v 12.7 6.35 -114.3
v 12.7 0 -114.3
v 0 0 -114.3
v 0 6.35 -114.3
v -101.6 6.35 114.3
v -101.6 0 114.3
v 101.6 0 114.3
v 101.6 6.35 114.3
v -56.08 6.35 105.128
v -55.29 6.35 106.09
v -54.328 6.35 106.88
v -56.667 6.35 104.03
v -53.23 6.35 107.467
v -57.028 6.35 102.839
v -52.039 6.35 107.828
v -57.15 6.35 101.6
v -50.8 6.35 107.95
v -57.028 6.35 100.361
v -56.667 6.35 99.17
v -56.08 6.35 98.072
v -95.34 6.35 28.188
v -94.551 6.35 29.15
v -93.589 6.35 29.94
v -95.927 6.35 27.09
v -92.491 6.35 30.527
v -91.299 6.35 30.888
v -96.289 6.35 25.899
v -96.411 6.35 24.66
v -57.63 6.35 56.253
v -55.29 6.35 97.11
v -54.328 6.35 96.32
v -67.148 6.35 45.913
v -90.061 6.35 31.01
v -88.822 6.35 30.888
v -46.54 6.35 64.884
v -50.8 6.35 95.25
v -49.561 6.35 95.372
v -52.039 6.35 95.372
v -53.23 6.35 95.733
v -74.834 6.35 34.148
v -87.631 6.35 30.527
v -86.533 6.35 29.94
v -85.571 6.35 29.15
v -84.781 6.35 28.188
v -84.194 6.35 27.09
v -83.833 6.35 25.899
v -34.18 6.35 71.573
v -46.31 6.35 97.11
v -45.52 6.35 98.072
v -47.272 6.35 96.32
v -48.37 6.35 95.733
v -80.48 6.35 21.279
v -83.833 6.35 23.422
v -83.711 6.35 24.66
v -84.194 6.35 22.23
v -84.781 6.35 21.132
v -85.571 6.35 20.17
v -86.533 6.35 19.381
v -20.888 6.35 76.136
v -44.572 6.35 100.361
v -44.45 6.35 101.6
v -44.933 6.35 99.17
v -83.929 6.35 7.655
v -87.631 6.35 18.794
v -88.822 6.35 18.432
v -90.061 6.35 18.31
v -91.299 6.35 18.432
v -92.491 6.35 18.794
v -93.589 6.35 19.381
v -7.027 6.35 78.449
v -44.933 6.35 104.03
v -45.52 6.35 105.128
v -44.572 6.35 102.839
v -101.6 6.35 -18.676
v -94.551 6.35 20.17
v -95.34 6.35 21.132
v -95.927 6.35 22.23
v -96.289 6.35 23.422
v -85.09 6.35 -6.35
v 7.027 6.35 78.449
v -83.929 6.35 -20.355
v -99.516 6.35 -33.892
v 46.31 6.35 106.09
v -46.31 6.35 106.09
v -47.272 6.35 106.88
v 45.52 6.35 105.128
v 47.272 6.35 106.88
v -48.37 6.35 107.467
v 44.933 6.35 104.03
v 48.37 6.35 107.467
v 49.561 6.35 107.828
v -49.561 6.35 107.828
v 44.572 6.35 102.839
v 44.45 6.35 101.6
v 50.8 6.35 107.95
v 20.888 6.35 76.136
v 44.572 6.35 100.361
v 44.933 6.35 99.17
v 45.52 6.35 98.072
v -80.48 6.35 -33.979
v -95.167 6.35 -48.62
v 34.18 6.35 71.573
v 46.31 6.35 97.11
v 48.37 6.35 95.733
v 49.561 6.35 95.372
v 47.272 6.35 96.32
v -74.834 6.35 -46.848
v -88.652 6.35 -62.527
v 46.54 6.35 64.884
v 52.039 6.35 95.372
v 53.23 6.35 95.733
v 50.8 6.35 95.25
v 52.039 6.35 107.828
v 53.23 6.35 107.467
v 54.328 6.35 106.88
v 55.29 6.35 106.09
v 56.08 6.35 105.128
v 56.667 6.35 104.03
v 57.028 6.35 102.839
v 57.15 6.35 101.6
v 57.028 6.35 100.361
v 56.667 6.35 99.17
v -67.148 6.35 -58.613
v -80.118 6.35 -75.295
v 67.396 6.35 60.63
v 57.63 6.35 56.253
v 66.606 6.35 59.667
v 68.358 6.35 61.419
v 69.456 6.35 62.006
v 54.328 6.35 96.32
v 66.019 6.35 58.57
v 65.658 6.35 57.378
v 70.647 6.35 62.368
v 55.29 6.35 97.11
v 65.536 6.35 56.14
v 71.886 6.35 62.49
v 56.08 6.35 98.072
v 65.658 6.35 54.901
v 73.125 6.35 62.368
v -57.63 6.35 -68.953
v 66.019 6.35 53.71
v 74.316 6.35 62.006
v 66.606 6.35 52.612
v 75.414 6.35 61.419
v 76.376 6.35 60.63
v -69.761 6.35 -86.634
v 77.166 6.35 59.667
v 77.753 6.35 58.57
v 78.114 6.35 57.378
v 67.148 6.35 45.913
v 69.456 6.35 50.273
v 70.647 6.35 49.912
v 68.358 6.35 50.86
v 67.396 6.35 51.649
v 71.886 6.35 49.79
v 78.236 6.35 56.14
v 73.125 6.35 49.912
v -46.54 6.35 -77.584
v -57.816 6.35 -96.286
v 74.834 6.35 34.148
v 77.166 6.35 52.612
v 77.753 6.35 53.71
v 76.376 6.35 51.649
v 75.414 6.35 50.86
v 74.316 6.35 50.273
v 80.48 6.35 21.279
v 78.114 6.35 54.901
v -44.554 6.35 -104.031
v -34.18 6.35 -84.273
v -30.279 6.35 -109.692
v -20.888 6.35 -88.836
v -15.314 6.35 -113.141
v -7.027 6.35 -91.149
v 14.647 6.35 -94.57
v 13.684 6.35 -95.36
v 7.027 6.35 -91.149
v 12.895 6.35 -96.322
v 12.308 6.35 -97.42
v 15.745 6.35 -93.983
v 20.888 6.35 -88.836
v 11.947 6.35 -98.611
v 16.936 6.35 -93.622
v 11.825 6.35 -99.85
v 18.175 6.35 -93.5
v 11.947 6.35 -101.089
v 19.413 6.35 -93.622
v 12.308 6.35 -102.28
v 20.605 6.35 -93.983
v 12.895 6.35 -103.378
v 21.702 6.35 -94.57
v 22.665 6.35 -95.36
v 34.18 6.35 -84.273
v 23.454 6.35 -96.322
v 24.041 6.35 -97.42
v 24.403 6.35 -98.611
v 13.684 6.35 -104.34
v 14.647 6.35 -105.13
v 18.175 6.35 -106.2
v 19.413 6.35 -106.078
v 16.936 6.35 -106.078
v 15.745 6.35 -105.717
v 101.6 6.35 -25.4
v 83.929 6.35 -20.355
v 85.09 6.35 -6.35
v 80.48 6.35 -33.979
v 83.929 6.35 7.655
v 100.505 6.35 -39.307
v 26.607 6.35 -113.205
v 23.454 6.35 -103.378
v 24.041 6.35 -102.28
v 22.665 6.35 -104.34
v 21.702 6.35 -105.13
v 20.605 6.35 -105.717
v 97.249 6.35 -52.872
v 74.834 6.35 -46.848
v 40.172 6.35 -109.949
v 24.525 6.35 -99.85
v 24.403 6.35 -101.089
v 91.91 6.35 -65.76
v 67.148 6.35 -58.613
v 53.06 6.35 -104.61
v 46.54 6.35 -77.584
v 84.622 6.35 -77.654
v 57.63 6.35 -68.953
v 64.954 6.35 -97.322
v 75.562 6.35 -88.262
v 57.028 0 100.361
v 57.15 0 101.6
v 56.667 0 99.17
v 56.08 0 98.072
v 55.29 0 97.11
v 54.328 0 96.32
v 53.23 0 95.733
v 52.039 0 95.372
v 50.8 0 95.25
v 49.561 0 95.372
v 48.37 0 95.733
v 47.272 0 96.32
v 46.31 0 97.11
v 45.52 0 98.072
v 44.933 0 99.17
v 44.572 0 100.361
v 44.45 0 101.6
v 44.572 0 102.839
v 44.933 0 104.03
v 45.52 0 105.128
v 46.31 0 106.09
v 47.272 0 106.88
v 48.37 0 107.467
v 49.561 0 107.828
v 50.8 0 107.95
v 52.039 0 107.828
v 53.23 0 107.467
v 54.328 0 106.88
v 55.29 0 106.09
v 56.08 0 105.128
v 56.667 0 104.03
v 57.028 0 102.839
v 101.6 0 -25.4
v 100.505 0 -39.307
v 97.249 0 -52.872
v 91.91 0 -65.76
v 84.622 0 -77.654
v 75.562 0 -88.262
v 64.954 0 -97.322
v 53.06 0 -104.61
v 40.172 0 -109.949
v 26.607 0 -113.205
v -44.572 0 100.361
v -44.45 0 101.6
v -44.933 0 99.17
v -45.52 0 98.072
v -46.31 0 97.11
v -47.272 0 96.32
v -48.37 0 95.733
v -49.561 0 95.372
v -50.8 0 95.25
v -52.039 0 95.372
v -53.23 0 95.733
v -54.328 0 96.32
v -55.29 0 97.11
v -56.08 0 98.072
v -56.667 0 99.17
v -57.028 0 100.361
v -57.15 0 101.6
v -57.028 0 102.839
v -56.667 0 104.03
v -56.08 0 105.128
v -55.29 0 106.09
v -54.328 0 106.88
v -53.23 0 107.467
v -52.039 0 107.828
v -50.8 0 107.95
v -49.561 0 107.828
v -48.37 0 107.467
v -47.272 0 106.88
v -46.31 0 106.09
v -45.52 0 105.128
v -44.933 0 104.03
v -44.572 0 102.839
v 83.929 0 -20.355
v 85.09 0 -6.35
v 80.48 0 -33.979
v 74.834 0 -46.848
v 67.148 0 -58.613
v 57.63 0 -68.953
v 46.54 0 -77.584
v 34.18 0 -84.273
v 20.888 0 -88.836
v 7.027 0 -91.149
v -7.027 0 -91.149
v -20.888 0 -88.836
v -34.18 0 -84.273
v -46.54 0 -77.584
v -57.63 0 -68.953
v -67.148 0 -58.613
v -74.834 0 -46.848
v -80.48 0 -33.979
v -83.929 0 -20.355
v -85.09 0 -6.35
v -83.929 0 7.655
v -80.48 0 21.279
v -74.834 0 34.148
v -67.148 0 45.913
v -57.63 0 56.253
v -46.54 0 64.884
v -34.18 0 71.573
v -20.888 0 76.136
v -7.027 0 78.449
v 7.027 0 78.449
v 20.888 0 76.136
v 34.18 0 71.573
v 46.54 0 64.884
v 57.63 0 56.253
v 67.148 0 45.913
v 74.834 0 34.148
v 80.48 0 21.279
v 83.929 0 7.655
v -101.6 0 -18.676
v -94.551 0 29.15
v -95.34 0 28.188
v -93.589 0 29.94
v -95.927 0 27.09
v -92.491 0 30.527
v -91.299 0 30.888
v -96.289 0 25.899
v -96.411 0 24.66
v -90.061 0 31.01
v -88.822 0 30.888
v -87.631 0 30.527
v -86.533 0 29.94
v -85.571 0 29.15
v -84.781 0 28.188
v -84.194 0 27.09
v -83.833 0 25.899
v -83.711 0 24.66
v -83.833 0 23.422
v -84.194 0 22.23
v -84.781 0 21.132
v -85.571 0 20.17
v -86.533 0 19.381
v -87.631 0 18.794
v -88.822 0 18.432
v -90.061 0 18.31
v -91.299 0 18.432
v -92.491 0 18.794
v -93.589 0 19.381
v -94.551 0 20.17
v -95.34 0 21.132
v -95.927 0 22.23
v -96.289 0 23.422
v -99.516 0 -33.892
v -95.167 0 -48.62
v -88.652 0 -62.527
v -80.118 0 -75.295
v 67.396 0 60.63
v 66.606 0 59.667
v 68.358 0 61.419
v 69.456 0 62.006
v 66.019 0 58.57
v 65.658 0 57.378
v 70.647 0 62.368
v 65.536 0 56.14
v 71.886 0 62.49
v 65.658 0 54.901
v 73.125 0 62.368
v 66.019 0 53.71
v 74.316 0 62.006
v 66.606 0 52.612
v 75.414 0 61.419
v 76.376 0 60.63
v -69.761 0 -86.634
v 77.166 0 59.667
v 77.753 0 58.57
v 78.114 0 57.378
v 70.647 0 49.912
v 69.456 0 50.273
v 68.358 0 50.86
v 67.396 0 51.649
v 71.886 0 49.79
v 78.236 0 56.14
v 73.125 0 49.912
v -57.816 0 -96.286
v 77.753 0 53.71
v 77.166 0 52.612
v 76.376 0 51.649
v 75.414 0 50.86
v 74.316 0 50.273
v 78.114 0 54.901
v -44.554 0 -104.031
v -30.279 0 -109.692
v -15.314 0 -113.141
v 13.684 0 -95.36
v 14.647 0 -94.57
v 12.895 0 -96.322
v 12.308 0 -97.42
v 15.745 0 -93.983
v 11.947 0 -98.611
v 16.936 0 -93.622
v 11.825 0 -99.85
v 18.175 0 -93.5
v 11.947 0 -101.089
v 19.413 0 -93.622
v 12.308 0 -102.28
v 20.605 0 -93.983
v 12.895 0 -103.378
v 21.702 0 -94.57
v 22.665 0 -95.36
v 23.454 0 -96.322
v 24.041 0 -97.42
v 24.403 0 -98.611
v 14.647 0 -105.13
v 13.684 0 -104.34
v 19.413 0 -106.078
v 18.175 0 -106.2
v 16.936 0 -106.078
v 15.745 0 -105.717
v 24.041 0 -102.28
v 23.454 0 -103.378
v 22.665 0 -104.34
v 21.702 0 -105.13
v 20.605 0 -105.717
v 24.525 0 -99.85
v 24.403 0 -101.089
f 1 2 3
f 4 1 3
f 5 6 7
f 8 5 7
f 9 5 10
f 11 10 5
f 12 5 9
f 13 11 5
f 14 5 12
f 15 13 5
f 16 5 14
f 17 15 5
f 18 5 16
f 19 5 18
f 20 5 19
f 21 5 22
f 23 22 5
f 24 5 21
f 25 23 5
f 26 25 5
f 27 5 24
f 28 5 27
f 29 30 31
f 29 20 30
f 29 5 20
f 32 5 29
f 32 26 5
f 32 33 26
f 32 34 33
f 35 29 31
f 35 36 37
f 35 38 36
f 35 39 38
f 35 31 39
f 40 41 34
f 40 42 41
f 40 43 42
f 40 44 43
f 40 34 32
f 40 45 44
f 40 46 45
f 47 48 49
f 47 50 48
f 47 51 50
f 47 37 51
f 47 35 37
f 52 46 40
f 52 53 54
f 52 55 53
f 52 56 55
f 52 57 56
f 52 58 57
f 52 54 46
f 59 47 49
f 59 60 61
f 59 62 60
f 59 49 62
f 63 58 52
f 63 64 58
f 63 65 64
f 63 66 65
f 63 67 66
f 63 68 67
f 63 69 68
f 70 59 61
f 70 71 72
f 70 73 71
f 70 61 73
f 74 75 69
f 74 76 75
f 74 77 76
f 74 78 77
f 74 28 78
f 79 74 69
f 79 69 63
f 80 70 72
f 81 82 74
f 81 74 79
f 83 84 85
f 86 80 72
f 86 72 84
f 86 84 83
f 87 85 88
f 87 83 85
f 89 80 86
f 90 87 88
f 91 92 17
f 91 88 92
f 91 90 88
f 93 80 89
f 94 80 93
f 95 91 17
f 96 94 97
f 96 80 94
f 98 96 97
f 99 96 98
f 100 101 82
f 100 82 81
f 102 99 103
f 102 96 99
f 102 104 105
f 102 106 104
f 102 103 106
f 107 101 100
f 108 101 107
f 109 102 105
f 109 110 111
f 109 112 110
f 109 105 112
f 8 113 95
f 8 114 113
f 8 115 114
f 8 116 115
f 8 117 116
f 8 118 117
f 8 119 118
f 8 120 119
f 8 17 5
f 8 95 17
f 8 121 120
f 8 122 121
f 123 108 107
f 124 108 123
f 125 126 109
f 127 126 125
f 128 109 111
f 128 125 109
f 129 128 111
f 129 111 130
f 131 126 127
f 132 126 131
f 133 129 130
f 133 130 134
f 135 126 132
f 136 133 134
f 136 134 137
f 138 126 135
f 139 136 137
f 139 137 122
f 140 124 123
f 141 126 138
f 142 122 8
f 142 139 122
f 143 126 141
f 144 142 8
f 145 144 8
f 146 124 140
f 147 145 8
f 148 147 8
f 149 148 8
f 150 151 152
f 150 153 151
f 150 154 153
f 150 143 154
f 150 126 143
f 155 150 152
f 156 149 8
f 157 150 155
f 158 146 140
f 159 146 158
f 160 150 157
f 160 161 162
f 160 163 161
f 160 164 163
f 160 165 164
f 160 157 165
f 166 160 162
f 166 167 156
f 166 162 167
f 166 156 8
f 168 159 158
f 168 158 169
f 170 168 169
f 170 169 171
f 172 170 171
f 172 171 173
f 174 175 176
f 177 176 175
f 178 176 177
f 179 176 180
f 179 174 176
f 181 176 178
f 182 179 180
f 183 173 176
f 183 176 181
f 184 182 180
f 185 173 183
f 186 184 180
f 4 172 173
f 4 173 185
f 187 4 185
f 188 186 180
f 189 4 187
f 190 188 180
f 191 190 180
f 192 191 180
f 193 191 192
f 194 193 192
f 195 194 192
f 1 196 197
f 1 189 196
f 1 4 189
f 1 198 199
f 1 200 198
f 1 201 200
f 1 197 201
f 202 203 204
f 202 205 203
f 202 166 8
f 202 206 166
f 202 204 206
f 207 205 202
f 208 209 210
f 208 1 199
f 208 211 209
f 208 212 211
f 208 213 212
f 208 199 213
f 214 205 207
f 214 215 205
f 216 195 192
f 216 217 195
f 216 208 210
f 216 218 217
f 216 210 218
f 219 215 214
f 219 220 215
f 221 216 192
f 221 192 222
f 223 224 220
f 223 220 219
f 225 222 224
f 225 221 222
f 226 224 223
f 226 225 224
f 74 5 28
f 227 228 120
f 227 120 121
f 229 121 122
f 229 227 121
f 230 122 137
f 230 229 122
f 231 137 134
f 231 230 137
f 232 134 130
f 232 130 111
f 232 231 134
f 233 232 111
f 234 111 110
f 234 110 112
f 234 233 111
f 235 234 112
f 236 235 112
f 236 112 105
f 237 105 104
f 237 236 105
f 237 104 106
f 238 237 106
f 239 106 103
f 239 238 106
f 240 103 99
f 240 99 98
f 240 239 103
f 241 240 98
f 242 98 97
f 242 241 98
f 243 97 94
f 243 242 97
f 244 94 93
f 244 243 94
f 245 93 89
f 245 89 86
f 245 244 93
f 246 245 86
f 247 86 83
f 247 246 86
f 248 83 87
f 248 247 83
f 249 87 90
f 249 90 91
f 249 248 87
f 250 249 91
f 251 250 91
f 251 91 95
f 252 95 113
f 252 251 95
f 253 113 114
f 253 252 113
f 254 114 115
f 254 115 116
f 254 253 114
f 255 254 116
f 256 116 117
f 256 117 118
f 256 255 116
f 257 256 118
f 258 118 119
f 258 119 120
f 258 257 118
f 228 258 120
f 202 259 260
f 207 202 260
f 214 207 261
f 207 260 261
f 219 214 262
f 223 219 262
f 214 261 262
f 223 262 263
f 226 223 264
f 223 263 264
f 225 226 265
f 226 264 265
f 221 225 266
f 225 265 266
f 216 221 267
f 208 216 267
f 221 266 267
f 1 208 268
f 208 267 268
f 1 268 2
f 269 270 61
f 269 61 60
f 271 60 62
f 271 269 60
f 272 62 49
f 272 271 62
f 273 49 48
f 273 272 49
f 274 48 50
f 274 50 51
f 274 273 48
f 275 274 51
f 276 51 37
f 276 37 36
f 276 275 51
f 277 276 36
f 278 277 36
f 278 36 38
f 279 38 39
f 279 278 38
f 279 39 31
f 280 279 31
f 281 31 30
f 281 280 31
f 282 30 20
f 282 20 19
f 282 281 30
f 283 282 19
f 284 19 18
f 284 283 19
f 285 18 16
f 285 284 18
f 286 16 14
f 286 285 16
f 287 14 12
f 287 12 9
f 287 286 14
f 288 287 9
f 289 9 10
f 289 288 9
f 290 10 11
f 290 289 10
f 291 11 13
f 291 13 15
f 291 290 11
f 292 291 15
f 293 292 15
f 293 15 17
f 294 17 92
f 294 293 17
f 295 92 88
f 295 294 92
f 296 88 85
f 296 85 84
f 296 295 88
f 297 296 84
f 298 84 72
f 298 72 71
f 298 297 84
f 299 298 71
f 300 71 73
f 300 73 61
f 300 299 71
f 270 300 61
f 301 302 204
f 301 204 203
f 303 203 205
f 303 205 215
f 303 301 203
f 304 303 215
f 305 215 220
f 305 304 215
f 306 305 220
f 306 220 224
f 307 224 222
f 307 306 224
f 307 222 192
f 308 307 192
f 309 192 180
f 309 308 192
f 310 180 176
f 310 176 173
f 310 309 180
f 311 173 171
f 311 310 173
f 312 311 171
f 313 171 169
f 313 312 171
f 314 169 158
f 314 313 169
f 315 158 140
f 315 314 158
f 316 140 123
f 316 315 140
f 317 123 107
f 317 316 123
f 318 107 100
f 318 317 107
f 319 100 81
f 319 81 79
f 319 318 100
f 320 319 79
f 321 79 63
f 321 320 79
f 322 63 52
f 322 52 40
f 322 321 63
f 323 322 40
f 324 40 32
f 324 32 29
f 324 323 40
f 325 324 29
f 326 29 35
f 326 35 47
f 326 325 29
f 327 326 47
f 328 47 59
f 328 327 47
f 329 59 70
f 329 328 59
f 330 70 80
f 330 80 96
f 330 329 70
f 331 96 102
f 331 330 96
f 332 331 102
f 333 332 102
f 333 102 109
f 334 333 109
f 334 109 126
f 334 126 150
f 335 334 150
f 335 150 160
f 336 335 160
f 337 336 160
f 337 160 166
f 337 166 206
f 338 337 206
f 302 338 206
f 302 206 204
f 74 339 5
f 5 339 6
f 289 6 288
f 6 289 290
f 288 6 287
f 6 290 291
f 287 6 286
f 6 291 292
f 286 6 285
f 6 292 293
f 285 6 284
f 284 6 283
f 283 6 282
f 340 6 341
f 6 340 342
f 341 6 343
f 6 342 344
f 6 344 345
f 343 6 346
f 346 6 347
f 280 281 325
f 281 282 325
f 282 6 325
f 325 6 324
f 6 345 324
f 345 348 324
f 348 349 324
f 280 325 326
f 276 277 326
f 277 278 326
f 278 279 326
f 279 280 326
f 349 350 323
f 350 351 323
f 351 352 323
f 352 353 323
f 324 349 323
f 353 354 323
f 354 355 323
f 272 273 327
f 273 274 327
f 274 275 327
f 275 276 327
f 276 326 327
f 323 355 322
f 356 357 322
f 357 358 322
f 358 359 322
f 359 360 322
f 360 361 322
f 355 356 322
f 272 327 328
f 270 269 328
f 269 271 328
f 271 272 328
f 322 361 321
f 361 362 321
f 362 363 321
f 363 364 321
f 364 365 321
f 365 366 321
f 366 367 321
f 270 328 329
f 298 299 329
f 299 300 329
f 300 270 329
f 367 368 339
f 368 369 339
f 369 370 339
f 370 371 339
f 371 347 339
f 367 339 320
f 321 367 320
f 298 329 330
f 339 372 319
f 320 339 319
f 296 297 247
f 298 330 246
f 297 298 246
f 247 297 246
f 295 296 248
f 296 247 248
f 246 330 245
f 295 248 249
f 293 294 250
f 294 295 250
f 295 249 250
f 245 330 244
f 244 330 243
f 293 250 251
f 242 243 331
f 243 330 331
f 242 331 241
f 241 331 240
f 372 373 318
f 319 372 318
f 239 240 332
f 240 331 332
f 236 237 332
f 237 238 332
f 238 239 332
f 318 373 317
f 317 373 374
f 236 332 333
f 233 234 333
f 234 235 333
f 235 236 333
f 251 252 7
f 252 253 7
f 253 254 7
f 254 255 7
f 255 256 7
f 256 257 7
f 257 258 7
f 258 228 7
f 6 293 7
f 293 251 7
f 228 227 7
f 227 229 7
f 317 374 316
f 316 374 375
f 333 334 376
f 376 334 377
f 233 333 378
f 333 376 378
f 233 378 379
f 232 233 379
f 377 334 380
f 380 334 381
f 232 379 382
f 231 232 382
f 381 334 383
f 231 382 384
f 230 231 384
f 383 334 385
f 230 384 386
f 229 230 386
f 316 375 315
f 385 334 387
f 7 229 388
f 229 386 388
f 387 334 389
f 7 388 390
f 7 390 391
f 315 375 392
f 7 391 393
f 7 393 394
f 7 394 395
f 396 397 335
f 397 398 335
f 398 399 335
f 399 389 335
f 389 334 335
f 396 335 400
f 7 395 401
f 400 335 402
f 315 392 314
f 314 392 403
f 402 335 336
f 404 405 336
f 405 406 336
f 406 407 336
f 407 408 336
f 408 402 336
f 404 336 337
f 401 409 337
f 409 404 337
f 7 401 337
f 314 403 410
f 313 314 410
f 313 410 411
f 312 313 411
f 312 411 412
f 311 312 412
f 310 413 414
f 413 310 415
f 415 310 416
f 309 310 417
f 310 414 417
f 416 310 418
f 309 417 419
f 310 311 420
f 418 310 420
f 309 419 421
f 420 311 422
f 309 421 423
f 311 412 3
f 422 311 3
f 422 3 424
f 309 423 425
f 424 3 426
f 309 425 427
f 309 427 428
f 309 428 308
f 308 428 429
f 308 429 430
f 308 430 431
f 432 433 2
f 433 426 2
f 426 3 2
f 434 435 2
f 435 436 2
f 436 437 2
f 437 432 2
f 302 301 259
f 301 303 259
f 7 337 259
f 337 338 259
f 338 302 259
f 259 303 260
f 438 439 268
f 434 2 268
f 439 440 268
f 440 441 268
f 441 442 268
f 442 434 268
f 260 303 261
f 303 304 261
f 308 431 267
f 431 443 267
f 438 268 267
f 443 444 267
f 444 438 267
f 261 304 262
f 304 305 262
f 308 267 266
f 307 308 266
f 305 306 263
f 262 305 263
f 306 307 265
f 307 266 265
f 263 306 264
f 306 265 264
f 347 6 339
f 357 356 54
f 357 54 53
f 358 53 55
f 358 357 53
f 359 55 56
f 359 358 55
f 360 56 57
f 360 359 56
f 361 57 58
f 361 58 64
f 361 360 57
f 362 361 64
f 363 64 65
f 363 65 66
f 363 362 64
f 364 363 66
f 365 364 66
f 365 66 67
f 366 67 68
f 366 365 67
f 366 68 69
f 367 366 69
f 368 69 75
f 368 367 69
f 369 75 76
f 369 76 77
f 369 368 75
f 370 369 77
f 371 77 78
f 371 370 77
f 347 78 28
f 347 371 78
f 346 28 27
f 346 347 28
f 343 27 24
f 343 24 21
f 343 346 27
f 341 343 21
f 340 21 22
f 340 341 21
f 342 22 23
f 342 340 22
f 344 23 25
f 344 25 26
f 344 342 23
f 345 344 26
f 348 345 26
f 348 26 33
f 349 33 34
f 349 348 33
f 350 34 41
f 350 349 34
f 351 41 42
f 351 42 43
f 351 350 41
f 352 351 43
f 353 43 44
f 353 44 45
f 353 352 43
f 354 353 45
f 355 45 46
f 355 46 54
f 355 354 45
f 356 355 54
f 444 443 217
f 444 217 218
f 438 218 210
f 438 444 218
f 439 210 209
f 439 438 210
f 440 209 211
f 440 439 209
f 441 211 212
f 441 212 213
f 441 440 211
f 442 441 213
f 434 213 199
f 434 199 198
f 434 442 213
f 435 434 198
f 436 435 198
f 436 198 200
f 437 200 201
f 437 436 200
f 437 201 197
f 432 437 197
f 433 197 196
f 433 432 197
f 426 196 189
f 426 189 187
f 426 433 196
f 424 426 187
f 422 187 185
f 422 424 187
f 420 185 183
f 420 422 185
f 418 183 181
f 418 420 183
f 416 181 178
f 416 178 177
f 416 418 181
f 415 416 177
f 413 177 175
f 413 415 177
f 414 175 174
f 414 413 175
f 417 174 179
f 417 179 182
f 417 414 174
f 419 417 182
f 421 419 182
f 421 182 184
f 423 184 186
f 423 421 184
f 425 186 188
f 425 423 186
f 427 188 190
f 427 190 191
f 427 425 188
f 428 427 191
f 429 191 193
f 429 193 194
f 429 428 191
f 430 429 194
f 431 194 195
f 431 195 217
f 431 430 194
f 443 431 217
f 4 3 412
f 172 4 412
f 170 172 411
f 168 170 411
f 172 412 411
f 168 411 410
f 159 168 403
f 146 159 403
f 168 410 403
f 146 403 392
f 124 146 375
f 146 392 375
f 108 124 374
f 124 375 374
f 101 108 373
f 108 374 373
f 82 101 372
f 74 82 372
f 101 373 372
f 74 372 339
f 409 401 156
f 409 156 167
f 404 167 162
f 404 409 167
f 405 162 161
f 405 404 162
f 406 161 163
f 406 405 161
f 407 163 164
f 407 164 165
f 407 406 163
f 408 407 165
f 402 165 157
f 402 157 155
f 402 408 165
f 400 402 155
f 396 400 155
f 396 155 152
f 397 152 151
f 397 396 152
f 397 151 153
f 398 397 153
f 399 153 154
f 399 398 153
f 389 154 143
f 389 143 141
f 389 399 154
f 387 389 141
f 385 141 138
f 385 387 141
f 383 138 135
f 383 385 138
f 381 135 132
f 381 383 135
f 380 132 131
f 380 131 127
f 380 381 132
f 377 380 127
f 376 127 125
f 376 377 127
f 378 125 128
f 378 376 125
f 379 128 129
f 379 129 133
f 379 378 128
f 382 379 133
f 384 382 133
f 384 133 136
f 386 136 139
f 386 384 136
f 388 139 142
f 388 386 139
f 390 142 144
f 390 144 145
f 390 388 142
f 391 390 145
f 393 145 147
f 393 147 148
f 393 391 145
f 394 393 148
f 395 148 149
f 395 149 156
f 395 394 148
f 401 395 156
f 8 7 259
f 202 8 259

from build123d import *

# Parameters (mm, degrees)
SKETCH1_R           = 85.09
SKETCH1_R_2         = 6.35
BOSS_EXTRUDE1_DEPTH = 6.35


with BuildPart() as part:
    # Sketch1 → Boss-Extrude1 (new body)
    with BuildSketch(Plane(origin=(0, 0, 0), x_dir=(1, 0, 0), z_dir=(0, 1, 0))):
        with BuildLine():
            Line((12.7, 114.3), (0, 114.3))
            ThreePointArc((0, 114.3), (-69.761055355, 86.634356609), (-101.6, 18.676470588))
            Line((-101.6, 18.676470588), (-101.6, -114.3))
            Line((-101.6, -114.3), (101.6, -114.3))
            Line((101.6, -114.3), (101.6, 25.4))
            ThreePointArc((101.6, 25.4), (75.561792847, 88.261792847), (12.7, 114.3))
        make_face()
        with Locations((0, 6.35)):
            Circle(SKETCH1_R, mode=Mode.SUBTRACT)
        with Locations((-90.060644326, -24.660366712)):
            Circle(SKETCH1_R_2, mode=Mode.SUBTRACT)
        with Locations((-50.8, -101.6)):
            Circle(SKETCH1_R_2, mode=Mode.SUBTRACT)
        with Locations((50.8, -101.6)):
            Circle(SKETCH1_R_2, mode=Mode.SUBTRACT)
        with Locations((18.17455681, 99.849989223)):
            Circle(SKETCH1_R_2, mode=Mode.SUBTRACT)
        with Locations((71.886087516, -56.139622511)):
            Circle(SKETCH1_R_2, mode=Mode.SUBTRACT)
    extrude(amount=BOSS_EXTRUDE1_DEPTH)


solid = part.part
